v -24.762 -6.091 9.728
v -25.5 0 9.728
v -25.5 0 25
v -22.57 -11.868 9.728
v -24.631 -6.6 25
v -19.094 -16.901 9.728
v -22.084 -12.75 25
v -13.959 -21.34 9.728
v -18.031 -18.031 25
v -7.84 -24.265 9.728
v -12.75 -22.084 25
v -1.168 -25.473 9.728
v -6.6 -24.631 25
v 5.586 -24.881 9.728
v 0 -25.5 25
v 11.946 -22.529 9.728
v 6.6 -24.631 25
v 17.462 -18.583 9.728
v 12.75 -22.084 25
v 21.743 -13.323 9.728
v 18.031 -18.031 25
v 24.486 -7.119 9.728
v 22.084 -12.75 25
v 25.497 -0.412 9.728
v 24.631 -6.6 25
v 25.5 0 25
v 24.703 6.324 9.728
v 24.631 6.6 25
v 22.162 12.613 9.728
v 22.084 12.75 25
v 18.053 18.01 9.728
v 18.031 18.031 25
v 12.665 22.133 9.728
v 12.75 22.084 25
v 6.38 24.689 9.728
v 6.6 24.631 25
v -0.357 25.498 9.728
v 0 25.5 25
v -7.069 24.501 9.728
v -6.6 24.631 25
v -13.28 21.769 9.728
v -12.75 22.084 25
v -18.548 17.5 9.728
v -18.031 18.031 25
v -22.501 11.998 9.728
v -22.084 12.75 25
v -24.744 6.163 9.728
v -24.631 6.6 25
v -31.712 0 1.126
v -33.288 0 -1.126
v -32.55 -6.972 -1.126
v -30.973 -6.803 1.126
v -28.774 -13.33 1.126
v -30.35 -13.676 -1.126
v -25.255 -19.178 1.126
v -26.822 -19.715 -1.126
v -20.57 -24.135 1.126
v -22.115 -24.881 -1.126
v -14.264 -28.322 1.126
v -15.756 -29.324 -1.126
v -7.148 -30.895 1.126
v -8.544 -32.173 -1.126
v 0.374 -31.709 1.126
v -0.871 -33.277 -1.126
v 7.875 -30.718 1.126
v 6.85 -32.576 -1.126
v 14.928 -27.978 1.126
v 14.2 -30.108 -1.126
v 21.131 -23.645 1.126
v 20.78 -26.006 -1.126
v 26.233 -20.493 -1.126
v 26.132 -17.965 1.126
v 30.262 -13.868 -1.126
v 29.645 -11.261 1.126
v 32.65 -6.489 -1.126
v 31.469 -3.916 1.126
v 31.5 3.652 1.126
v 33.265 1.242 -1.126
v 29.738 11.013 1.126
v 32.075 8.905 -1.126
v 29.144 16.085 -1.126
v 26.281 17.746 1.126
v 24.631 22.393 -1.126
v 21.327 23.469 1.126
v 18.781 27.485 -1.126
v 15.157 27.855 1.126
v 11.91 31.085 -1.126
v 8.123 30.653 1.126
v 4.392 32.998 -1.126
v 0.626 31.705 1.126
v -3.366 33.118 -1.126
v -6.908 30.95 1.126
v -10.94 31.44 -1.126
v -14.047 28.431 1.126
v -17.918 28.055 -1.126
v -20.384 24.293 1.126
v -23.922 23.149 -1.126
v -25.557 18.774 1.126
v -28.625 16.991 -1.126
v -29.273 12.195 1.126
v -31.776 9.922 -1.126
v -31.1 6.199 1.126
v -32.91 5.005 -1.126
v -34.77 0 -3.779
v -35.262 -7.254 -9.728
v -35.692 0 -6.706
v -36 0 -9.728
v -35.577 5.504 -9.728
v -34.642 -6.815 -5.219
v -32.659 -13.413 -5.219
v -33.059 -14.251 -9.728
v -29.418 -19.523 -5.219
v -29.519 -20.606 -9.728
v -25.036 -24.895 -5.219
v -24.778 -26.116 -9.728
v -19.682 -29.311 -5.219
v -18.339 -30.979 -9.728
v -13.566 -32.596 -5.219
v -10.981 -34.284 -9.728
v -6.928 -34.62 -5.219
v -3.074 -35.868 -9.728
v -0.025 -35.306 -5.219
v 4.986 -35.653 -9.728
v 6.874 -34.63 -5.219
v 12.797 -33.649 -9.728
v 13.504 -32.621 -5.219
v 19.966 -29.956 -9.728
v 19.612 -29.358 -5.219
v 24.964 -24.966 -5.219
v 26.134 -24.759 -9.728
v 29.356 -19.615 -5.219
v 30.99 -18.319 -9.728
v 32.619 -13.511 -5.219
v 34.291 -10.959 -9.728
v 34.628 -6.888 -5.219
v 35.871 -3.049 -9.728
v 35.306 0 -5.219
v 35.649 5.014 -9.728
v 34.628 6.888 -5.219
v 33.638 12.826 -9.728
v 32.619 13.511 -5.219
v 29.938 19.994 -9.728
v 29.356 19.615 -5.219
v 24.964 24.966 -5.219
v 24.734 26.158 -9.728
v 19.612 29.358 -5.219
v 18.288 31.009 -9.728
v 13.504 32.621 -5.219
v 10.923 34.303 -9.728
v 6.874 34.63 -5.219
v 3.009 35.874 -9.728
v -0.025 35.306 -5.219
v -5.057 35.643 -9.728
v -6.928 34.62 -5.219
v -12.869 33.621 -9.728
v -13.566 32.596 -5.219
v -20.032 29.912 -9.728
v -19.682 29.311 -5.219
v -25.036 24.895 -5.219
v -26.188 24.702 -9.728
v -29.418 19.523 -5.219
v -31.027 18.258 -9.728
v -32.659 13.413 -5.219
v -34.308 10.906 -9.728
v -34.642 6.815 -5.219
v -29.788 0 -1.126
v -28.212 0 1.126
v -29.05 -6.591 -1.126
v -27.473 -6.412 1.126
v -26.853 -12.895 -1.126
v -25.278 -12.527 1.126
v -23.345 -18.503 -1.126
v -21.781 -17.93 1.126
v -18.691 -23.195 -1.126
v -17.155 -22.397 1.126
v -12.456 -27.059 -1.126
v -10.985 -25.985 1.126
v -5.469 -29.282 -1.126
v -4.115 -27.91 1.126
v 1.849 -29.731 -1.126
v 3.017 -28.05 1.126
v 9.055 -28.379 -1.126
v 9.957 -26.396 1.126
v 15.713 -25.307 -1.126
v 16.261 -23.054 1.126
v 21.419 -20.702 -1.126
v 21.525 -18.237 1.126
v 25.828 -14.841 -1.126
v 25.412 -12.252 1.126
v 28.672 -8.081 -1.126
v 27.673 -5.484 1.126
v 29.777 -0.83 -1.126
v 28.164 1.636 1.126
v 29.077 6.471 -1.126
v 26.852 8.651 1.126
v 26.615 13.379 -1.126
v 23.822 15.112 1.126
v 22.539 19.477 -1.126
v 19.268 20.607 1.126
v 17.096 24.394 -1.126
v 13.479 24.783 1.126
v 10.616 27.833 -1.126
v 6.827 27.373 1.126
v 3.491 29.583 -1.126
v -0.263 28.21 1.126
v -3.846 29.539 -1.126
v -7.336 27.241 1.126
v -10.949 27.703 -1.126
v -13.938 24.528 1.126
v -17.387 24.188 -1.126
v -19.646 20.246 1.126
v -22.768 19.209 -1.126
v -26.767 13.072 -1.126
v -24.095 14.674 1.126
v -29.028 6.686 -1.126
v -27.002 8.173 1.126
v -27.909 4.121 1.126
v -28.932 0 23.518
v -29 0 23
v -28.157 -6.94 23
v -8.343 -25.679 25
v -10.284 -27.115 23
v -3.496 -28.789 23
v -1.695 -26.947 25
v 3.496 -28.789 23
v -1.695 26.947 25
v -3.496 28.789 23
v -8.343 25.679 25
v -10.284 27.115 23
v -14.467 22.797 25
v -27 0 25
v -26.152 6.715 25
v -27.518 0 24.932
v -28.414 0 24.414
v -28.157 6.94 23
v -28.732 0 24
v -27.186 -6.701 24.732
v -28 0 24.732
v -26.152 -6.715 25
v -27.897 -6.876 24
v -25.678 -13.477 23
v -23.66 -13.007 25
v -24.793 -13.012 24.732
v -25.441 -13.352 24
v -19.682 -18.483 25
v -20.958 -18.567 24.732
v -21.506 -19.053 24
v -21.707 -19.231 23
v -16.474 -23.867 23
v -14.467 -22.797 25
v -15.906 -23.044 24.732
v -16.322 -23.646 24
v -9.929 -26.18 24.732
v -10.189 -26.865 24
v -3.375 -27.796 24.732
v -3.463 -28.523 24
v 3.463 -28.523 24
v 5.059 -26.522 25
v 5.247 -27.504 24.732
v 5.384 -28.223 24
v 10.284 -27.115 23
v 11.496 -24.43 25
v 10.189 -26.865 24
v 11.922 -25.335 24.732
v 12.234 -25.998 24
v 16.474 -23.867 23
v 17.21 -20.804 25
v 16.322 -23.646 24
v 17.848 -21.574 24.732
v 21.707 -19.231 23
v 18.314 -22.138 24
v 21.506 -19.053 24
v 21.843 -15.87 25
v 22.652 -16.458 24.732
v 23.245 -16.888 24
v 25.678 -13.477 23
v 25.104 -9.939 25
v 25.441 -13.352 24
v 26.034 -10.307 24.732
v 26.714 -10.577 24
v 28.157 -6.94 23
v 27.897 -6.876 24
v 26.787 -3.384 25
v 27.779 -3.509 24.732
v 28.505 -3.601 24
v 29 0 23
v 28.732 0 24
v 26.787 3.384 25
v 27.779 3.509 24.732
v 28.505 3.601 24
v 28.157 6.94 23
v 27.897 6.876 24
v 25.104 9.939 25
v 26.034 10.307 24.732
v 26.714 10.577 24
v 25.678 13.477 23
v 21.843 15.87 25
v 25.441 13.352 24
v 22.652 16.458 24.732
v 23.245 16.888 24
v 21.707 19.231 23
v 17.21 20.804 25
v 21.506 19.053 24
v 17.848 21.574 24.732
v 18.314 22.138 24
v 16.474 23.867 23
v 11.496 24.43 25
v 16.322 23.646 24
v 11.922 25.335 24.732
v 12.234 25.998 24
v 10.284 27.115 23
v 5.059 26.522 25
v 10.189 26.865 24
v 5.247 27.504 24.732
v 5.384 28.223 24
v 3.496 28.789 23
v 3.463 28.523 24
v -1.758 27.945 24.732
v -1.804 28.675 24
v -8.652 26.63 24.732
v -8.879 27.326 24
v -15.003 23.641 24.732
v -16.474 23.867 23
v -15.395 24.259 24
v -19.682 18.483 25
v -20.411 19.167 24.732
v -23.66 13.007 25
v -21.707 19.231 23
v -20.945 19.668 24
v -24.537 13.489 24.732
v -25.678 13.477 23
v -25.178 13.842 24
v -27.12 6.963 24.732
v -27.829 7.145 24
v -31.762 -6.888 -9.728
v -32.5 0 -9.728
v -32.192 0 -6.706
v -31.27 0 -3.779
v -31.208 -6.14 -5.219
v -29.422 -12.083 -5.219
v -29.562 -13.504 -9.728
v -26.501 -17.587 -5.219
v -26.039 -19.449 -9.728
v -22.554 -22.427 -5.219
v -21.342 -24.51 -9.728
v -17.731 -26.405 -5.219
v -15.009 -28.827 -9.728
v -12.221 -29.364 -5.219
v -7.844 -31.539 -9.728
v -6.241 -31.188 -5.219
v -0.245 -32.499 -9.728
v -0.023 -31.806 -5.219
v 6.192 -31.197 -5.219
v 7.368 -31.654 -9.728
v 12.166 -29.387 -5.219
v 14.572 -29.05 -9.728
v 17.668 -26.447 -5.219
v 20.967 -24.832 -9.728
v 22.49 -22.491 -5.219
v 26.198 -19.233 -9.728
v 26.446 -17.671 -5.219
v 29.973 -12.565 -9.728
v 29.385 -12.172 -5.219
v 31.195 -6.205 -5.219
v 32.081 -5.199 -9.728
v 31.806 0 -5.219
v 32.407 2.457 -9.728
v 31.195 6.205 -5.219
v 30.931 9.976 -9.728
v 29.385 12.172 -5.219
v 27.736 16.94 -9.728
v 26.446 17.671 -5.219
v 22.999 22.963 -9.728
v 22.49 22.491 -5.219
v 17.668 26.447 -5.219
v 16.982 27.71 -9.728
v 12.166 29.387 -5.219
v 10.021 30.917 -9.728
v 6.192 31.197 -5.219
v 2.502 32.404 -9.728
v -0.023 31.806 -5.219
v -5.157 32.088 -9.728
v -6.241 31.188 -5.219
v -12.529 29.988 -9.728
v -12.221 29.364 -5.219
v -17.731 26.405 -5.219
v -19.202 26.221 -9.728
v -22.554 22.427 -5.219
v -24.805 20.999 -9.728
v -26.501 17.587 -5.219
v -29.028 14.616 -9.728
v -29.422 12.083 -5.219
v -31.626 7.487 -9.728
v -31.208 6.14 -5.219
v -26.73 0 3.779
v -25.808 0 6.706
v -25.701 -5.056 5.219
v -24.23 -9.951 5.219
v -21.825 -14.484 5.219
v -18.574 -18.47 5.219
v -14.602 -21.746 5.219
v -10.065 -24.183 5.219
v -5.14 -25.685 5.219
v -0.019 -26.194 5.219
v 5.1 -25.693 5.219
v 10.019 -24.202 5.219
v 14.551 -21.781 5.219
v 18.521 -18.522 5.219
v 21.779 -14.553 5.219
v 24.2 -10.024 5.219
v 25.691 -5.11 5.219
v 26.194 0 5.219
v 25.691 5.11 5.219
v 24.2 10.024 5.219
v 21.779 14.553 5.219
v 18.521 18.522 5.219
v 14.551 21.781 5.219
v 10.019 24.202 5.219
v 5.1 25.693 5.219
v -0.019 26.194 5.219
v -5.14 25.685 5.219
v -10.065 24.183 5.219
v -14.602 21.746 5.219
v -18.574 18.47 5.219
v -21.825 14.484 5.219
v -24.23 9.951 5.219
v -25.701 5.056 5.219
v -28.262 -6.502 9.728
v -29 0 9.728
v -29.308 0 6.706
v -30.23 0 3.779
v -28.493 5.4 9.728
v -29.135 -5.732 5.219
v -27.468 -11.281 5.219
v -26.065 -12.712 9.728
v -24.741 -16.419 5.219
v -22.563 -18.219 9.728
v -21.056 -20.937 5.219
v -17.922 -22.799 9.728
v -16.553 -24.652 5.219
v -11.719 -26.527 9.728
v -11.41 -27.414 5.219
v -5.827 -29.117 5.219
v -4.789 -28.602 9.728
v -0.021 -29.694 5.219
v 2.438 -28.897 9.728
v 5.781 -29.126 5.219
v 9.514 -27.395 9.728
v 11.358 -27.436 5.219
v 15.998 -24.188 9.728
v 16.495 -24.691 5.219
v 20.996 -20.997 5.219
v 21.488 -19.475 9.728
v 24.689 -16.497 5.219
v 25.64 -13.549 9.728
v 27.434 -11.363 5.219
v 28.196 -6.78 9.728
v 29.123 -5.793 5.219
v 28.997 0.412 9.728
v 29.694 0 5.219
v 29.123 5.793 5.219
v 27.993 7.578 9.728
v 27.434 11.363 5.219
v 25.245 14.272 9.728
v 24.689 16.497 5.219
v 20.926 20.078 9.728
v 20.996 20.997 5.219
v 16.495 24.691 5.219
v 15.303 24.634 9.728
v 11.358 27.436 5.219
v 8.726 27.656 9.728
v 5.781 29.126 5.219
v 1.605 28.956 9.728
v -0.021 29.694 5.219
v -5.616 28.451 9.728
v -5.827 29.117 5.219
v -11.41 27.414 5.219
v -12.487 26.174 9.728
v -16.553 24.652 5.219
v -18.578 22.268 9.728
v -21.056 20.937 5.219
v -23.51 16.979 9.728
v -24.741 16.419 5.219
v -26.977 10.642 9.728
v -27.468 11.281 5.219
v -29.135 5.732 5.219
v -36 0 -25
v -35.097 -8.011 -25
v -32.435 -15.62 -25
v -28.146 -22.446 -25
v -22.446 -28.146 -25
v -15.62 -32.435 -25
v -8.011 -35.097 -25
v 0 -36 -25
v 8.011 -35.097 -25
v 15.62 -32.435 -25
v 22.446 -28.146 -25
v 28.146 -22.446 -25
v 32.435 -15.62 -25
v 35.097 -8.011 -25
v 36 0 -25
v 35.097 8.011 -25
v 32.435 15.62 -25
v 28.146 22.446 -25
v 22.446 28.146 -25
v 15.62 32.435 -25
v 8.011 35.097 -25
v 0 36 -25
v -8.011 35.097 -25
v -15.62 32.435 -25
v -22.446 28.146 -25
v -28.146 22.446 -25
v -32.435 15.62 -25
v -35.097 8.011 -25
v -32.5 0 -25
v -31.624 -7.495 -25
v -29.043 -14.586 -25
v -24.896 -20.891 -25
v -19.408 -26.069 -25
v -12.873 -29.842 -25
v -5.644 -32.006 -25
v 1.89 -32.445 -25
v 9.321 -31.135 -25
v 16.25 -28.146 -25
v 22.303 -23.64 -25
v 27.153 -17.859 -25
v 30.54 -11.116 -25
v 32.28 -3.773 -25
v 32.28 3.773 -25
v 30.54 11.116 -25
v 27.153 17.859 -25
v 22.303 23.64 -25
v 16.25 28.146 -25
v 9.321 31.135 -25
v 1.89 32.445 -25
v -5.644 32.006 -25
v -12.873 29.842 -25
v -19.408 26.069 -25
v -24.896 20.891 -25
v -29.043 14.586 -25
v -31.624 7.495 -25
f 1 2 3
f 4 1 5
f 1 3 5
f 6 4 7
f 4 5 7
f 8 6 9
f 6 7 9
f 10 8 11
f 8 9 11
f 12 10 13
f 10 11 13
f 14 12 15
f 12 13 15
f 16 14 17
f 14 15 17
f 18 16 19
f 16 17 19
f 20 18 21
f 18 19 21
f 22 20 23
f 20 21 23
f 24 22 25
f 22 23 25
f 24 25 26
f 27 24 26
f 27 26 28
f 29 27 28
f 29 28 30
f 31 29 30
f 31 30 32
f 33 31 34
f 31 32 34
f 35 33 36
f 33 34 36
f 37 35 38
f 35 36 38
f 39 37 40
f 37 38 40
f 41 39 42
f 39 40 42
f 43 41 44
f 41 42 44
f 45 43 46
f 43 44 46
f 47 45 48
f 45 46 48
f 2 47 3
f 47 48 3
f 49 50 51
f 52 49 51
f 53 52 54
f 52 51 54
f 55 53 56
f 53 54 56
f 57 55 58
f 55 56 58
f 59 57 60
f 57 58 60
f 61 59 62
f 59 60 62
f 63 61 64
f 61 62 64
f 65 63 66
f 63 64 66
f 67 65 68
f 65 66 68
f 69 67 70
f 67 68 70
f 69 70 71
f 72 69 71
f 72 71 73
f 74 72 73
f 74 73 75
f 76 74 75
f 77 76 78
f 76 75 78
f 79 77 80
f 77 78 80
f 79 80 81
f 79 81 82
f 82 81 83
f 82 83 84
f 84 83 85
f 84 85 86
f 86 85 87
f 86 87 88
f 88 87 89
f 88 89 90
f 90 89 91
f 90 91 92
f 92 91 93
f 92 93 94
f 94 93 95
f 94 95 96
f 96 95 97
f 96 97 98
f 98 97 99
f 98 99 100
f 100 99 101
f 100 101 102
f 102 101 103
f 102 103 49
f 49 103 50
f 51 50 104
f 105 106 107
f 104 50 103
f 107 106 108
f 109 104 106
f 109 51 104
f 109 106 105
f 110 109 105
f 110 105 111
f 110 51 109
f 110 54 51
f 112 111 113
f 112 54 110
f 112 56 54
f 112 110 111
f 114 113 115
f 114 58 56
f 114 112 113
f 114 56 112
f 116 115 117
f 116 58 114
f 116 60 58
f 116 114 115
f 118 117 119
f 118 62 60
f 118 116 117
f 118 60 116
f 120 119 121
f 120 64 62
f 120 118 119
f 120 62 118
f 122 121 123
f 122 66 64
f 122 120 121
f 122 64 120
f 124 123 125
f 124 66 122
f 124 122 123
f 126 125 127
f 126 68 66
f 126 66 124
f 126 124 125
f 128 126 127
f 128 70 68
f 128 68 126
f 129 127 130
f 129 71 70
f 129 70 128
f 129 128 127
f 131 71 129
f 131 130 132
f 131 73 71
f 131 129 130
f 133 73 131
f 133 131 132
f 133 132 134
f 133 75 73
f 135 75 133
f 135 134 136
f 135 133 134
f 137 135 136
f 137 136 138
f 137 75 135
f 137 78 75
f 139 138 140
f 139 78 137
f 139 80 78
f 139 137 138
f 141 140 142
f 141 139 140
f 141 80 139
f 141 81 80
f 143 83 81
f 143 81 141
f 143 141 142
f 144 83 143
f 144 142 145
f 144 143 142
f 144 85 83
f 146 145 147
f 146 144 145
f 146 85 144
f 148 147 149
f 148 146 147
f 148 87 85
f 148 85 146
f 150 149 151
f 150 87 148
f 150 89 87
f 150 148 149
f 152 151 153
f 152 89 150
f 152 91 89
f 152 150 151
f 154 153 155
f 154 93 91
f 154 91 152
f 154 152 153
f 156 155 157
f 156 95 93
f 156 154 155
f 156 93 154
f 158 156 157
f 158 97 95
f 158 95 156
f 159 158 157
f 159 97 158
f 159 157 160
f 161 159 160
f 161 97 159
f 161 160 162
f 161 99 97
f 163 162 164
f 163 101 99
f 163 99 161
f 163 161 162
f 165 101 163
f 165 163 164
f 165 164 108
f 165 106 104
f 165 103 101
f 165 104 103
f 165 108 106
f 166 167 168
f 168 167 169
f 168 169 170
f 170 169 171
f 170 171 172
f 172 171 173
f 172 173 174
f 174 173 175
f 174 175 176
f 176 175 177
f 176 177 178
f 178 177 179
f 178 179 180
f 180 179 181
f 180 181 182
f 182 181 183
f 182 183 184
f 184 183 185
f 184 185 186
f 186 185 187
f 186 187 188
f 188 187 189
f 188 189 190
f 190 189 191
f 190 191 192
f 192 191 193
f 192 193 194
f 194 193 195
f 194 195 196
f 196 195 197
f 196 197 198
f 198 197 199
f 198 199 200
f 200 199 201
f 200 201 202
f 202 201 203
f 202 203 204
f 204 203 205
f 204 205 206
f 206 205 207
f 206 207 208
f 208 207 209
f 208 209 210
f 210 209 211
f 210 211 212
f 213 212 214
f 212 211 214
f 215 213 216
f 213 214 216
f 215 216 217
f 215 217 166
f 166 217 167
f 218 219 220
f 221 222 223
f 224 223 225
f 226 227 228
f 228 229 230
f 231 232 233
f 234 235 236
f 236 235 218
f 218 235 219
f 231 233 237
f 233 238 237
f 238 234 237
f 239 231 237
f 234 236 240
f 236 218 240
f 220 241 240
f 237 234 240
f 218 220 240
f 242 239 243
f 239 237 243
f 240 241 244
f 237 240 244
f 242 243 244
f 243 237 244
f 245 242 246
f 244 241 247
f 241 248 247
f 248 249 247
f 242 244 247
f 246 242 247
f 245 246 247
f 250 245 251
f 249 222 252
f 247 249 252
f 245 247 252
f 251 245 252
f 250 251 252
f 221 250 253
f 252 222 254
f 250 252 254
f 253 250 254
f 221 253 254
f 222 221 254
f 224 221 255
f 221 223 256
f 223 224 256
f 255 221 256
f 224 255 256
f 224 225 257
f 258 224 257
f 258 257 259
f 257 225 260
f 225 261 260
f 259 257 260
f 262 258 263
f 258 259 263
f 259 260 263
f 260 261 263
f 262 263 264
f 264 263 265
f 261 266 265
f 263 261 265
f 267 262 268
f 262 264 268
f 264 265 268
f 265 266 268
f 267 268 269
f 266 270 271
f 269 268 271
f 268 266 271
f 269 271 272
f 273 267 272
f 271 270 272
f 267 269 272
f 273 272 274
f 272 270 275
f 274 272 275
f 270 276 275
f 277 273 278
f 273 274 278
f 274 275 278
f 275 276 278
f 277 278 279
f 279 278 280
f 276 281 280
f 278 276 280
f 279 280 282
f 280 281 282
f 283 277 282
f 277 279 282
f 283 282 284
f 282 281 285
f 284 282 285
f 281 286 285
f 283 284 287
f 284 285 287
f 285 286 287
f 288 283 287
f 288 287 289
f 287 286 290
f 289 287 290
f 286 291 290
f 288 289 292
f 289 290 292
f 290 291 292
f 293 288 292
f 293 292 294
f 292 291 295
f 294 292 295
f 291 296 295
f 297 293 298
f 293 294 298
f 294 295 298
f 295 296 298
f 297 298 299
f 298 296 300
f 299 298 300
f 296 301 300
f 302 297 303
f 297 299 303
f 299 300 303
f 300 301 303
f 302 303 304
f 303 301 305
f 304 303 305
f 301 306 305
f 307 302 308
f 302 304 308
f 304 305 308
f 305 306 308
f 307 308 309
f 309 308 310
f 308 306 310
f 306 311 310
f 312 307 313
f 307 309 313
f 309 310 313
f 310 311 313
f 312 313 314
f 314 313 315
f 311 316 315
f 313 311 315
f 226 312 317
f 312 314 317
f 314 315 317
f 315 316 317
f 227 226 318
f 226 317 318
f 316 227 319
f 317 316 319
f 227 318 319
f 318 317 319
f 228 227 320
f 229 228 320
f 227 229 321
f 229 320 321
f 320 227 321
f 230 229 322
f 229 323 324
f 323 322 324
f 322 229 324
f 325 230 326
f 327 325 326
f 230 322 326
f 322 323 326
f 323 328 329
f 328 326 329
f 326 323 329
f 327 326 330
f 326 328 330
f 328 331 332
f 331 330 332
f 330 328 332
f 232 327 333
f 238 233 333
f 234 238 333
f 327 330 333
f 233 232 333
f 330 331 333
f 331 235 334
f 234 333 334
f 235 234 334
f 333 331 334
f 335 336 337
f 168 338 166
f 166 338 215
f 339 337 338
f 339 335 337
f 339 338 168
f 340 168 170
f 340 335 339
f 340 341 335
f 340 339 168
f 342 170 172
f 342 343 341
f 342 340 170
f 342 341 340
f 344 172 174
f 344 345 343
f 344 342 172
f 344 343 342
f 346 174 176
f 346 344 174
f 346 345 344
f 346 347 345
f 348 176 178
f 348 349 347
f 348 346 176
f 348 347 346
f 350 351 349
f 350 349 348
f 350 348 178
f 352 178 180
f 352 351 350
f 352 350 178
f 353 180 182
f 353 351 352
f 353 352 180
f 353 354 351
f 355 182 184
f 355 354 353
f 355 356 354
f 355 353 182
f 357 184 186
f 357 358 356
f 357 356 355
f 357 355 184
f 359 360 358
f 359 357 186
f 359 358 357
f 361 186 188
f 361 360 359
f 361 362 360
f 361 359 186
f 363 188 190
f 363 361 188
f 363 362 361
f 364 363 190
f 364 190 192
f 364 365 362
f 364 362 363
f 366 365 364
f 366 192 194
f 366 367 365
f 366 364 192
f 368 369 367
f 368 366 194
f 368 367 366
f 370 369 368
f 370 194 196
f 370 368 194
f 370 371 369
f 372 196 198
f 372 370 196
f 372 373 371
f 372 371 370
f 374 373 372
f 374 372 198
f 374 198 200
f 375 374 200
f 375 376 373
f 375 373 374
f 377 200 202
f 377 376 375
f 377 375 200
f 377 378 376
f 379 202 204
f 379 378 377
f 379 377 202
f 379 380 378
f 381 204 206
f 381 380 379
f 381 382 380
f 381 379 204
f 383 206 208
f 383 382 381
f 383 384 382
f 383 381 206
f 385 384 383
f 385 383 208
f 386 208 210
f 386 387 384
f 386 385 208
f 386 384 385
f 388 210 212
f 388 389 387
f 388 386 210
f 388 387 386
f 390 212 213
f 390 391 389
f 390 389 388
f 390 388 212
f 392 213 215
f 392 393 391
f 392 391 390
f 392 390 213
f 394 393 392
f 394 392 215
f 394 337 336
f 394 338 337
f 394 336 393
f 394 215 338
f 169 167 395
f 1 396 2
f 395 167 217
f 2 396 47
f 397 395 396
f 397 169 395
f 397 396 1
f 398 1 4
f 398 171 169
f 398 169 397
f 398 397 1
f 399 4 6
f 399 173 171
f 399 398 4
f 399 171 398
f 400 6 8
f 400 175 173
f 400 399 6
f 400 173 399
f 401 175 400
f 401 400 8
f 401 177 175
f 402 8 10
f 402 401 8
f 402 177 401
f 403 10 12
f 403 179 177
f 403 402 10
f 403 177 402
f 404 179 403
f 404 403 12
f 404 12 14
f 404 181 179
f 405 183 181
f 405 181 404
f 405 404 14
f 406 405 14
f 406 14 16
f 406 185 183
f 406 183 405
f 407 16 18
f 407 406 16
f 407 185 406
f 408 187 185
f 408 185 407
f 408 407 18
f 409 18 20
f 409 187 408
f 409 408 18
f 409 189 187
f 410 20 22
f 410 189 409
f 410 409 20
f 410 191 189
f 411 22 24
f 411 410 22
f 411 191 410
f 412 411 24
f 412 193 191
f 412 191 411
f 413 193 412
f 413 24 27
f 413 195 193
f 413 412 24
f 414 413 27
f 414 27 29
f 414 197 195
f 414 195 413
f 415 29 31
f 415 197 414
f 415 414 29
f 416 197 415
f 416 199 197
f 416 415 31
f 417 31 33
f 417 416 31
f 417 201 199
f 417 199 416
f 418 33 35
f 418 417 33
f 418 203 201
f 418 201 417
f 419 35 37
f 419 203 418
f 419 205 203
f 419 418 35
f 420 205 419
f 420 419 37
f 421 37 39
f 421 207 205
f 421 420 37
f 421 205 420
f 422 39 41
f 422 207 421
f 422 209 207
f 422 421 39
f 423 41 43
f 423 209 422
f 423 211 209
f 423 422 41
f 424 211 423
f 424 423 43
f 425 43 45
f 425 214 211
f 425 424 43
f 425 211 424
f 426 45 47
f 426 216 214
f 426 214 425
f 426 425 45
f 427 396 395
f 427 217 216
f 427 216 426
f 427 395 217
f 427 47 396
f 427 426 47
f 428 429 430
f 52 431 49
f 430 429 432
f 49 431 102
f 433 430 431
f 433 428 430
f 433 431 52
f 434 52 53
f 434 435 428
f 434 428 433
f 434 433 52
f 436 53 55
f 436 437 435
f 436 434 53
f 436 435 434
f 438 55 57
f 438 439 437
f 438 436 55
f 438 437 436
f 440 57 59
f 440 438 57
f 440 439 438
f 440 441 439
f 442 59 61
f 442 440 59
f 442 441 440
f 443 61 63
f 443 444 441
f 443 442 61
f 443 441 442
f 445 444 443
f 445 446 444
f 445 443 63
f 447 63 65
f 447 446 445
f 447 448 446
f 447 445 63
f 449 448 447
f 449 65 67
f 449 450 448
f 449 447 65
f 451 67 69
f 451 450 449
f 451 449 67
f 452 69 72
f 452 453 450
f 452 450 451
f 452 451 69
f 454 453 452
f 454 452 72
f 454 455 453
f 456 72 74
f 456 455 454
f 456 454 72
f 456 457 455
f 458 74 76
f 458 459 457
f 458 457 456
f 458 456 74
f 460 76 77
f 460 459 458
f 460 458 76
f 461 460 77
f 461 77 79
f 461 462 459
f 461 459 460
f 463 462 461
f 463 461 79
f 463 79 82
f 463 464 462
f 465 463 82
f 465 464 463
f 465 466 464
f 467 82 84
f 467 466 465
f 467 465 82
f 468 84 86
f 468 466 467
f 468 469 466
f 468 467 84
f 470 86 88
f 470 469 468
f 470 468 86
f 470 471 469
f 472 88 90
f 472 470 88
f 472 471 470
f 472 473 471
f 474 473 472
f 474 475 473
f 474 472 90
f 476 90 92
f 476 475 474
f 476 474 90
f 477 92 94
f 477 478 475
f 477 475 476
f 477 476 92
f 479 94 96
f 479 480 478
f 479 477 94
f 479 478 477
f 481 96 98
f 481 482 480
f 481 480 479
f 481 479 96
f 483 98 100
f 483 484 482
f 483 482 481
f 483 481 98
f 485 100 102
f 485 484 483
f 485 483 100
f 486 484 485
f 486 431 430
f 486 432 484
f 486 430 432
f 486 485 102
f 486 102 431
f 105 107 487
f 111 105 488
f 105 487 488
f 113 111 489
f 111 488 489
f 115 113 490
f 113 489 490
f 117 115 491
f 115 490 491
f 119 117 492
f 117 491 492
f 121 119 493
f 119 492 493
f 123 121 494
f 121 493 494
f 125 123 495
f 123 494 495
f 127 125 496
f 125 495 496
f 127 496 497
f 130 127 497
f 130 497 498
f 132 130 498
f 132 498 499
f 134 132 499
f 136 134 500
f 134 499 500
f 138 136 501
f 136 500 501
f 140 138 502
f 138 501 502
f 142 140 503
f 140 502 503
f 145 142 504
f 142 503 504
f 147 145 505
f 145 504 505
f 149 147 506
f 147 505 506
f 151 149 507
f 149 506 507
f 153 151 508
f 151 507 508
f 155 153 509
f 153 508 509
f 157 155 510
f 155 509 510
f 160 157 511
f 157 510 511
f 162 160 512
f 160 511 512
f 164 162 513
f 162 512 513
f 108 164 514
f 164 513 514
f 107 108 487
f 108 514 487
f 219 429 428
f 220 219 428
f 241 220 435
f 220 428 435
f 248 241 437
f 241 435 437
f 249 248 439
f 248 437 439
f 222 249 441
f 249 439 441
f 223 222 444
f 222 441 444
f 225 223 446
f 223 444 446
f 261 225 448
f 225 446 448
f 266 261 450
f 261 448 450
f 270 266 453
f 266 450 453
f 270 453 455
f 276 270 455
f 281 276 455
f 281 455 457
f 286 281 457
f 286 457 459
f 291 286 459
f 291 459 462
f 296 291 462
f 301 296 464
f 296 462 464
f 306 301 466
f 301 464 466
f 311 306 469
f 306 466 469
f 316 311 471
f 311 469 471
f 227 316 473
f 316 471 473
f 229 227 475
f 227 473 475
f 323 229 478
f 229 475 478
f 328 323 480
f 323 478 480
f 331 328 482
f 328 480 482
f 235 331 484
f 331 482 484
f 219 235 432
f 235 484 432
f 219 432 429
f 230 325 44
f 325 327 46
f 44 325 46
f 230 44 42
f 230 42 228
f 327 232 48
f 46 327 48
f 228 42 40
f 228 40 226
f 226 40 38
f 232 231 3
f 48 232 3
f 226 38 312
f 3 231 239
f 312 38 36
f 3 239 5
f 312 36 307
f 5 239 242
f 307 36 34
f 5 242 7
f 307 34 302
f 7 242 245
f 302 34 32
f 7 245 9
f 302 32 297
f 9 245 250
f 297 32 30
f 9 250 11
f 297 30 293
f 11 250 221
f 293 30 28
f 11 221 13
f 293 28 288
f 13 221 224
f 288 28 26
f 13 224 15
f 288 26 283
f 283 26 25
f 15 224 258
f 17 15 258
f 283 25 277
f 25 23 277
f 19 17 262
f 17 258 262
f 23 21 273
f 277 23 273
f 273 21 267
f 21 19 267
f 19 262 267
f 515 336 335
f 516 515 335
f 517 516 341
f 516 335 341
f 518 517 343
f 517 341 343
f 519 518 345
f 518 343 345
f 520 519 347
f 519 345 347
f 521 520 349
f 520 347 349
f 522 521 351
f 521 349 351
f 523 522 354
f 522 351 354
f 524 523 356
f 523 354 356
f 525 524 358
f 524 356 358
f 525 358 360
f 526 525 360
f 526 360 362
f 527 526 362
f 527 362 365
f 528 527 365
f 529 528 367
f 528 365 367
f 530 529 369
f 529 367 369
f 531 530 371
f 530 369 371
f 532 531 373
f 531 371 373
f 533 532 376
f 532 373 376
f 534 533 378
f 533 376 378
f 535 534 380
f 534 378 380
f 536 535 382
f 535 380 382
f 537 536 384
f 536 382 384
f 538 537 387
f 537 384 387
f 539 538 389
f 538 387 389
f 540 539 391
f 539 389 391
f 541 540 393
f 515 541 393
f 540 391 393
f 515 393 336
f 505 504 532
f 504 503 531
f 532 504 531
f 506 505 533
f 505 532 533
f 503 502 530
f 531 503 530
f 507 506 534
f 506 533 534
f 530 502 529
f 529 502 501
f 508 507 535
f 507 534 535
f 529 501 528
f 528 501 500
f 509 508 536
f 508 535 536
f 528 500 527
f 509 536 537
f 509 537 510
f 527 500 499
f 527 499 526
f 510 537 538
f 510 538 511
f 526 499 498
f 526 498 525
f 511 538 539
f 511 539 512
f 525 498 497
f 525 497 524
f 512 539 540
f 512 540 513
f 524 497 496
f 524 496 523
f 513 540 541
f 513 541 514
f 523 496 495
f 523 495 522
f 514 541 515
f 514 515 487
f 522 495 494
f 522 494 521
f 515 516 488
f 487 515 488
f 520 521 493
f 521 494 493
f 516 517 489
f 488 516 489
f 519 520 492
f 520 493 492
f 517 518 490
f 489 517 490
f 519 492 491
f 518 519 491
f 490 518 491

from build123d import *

# Parameters (mm, degrees)
F2_R = 15
F3_R = 2


with BuildPart() as f1:
    # F0 (on Front) → F1 (revolve)
    with BuildSketch(Plane.XZ):
        Polygon((-36, -25), (-32.5, -25), (-32.5, -5), (-25.5, 5), (-25.5, 25), (-29, 25), (-29, 5), (-36, -5), align=None)
    revolve(axis=Axis((0, 0, 12.5), (0, 0, 1)))

    # F2
    f2_edges = [f1.edges().sort_by_distance(p)[0] for p in [
        (29, 0, 5),
        (36, 0, -5),
        (25.5, 0, 5),
        (32.5, 0, -5),
    ]]
    fillet(f2_edges, radius=F2_R)

    # F3
    f3_edges = [f1.edges().sort_by_distance(p)[0] for p in [
        (29, 0, 25),
    ]]
    fillet(f3_edges, radius=F3_R)


solid = f1.part
